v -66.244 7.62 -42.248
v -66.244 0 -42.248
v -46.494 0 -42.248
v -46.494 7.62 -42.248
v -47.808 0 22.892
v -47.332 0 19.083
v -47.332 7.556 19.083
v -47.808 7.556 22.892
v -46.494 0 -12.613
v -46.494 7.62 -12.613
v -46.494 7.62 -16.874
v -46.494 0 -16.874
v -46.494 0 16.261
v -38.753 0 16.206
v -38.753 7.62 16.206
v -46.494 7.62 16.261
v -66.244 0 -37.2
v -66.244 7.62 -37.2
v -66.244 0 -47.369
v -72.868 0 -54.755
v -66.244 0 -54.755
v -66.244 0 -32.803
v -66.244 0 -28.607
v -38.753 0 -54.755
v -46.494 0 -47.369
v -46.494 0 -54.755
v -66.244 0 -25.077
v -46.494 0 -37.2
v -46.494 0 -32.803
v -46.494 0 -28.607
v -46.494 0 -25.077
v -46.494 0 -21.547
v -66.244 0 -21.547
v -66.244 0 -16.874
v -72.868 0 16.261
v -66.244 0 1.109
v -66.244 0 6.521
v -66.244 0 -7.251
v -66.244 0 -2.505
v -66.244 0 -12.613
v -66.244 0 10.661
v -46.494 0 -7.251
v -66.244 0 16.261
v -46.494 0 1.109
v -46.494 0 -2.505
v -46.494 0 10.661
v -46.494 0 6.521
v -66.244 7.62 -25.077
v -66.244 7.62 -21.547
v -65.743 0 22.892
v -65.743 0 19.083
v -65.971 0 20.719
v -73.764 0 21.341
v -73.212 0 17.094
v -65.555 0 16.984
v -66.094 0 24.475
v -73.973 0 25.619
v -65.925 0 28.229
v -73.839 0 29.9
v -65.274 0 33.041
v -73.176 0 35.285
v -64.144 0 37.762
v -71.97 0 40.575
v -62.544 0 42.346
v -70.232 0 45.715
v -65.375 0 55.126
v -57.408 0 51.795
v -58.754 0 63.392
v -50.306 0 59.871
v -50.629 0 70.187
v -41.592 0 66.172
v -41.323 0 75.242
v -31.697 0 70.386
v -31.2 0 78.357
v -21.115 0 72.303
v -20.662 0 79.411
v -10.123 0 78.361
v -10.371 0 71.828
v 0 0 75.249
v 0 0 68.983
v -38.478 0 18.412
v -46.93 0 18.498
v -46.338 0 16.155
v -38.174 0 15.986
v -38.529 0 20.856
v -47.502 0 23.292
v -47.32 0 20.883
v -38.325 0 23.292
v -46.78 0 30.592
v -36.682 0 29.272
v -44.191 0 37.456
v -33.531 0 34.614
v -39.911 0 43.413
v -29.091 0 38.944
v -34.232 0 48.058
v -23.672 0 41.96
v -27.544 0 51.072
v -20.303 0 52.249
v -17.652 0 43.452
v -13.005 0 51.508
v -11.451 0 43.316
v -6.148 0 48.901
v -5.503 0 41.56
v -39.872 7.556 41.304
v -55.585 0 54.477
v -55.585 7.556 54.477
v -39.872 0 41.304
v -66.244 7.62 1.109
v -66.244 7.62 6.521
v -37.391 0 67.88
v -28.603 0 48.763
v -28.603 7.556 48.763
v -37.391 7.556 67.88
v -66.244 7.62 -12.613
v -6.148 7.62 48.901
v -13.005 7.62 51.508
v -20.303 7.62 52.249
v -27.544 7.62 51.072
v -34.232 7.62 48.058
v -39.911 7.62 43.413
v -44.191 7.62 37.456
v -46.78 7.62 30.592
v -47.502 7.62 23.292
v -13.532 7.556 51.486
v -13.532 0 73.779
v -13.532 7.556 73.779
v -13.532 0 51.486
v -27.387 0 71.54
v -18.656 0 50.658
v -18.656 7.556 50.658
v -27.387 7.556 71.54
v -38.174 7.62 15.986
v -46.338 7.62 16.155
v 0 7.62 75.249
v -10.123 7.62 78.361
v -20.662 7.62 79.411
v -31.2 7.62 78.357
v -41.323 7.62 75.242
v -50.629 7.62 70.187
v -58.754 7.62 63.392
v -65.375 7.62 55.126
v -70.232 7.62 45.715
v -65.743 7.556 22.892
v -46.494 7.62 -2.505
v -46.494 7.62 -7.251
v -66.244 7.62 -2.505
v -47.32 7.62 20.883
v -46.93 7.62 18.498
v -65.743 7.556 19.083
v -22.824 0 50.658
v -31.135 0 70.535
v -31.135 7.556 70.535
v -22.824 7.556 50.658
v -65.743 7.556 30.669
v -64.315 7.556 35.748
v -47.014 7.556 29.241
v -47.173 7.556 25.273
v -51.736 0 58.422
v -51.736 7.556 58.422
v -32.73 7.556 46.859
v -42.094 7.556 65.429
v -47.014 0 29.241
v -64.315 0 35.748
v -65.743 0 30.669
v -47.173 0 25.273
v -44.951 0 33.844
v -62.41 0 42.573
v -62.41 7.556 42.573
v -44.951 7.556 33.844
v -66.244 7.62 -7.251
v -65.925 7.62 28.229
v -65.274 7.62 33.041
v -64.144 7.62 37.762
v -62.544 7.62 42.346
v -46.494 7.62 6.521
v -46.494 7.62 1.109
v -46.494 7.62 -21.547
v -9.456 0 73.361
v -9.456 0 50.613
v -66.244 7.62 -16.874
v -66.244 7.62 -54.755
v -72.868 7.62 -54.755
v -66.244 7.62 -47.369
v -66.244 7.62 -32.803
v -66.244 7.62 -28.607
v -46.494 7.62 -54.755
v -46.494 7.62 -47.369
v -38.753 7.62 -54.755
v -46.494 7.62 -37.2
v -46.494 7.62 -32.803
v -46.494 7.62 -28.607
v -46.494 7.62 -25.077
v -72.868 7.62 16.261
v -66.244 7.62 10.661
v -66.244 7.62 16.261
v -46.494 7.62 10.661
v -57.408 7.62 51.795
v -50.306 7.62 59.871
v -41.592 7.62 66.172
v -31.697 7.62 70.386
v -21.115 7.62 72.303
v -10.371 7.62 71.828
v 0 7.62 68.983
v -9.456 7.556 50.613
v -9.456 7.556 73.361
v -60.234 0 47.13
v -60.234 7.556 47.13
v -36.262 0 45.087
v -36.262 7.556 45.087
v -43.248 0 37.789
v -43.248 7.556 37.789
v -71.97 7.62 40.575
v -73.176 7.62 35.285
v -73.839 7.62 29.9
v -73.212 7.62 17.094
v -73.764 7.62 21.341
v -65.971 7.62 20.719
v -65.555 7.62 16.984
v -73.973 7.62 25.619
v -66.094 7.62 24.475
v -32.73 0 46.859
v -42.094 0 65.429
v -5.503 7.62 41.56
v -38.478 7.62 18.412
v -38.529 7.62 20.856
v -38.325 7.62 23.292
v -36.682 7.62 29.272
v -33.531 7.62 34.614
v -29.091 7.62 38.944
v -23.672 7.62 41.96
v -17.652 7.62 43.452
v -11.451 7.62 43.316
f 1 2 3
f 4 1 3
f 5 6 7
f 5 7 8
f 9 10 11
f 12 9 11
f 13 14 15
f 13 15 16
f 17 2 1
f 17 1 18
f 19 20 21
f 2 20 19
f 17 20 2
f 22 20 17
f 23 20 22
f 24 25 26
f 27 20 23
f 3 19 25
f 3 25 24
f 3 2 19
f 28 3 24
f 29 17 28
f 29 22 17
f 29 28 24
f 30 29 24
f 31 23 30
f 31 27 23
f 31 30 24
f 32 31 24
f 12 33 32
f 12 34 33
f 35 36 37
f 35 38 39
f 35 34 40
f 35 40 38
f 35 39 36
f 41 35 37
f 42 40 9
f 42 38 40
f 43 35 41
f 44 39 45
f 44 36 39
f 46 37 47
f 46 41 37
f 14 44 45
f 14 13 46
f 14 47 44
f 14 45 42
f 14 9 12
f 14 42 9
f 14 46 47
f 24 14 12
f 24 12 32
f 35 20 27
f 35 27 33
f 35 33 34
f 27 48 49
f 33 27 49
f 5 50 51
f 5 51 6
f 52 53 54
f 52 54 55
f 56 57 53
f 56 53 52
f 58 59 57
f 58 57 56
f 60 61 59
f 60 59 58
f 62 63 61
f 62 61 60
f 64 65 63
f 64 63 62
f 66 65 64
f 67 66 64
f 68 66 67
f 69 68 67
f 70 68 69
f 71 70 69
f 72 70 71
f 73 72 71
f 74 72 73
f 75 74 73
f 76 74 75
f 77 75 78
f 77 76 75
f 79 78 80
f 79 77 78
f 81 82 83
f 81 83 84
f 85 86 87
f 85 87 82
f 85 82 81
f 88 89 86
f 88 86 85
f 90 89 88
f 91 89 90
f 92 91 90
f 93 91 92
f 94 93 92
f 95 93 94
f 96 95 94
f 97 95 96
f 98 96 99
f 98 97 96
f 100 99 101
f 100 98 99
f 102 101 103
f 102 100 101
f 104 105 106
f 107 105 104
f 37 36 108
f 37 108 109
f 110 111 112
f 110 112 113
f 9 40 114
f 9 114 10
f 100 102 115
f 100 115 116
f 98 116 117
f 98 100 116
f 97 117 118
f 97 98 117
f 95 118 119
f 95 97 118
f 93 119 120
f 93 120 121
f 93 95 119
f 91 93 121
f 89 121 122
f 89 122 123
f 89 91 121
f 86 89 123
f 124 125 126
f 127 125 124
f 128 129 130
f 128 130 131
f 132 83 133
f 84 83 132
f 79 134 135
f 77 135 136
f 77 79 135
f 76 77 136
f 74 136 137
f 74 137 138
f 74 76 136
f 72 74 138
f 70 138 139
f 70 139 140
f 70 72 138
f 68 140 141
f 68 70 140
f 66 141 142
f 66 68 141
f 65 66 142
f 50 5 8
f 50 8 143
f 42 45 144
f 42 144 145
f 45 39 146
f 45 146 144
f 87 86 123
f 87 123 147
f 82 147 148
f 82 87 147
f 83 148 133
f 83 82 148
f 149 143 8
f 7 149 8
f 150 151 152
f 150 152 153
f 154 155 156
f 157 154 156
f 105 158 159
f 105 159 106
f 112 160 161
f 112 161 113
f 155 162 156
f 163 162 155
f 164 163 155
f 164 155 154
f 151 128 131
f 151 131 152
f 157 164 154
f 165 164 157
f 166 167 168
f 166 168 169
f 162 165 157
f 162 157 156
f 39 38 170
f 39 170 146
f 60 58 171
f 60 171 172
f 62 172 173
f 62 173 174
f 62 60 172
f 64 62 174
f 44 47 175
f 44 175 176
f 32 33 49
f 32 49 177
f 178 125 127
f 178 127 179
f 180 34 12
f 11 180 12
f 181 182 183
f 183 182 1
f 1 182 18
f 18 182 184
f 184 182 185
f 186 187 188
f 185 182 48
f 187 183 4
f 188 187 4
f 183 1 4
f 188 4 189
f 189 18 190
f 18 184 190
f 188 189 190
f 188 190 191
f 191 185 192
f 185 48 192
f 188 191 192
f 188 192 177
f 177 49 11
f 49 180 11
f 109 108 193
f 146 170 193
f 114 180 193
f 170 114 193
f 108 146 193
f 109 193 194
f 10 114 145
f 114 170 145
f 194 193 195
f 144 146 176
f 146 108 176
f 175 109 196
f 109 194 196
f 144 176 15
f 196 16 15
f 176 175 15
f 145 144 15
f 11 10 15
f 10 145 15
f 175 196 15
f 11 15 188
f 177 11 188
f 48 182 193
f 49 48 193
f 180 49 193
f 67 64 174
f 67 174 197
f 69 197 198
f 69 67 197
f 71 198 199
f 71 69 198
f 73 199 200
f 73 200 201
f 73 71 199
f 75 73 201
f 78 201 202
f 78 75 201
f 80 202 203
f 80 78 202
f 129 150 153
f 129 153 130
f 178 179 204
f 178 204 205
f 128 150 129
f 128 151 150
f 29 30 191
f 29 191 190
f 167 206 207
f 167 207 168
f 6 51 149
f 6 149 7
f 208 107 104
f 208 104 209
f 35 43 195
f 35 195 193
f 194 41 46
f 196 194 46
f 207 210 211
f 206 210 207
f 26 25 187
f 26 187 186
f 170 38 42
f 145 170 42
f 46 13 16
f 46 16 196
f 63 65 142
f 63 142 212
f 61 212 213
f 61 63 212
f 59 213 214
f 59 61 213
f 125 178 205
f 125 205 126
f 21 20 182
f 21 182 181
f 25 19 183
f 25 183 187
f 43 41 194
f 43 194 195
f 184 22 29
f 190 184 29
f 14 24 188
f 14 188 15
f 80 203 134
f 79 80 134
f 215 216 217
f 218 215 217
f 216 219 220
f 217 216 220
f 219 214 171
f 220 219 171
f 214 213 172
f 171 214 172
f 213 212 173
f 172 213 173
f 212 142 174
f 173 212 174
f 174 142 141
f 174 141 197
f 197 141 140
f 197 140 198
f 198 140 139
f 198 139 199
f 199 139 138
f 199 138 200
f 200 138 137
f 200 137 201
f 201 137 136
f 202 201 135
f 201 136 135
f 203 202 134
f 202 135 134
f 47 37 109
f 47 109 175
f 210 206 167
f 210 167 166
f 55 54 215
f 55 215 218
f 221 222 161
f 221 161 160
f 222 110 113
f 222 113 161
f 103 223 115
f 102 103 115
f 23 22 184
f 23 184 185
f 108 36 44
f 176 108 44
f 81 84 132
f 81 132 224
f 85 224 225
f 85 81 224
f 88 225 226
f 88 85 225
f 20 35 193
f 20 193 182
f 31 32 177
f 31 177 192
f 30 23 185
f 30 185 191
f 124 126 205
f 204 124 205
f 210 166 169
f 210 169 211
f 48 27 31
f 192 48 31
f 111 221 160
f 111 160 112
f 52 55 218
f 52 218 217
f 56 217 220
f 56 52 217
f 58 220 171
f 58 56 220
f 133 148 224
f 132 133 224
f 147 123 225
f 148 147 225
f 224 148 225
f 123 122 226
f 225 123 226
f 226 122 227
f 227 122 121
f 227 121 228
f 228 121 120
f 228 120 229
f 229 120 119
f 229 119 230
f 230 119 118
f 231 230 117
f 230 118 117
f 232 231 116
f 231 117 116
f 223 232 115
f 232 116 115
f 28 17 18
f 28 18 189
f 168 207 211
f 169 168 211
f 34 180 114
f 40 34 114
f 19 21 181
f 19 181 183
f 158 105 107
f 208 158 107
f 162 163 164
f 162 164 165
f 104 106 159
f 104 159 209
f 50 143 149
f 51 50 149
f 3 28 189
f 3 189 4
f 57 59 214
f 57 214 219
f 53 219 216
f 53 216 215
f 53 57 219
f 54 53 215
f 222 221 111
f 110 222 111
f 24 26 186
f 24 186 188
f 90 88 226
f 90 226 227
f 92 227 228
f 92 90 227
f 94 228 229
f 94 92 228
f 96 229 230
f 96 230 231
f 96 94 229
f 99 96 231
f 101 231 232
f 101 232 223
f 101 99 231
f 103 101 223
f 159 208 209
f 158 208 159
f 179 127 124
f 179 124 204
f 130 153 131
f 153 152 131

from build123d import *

# Parameters (mm, degrees)
F0_W     = 19.7499133646
F0_H     = 4.1402331553
F0_H_2   = 5.3616189398
F0_H_3   = 3.6131842062
F0_H_4   = 4.6723466367
F0_H_5   = 3.5303737968
F0_H_6   = 4.3972805142
F0_H_7   = 5.121588707
F1_DEPTH = 7.62
F3_DEPTH = 7.62
F5_DEPTH = 7.5565


with BuildPart() as f1:
    # F0 (on Front) → F1 (new body)
    with BuildSketch(Plane.XZ):
        with Locations((-56.3687663525, 8.5909834597)):
            Rectangle(F0_W, F0_H)
        Polygon((-66.2437230349, 16.2607766688), (-72.8681012988, 16.2607766688), (-72.8681012988, -54.7545775771), (-66.2437230349, -54.7545775771), (-66.2437230349, -51.4237135649), (-66.2437230349, -47.3692491651), (-66.2437230349, -42.2476604581), (-66.2437230349, -37.200499326), (-66.2437230349, -32.8032188118), (-66.2437230349, -28.6069251597), (-66.2437230349, -25.0765513629), (-66.2437230349, -21.5465798974), (-66.2437230349, -16.8742332608), (-66.2437230349, -12.6126082614), (-66.2437230349, -7.2509893216), (-66.2437230349, -2.5046177907), (-66.2437230349, 1.1085664155), (-66.2437230349, 6.5208668821), (-66.2437230349, 10.6611000374), align=None)
        Polygon((-46.4938096702, 16.2607766688), (-46.4938096702, 10.6611000374), (-46.4938096702, 6.5208668821), (-46.4938096702, 1.1085664155), (-46.4938096702, -2.5046177907), (-46.4938096702, -7.2509893216), (-46.4938096702, -12.6126082614), (-46.4938096702, -16.8742332608), (-46.4938096702, -21.5465798974), (-46.4938096702, -25.0765513629), (-46.4938096702, -28.6069251597), (-46.4938096702, -32.8032188118), (-46.4938096702, -37.200499326), (-46.4938096702, -42.2476604581), (-46.4938096702, -47.3692491651), (-46.4938096702, -51.4237135649), (-46.4938096702, -54.7545775771), (-38.75323385, -54.7545775771), (-38.75323385, 16.2060605315), align=None)
        with Locations((-56.3687663525, -9.9317987915)):
            Rectangle(F0_W, F0_H_2)
        with Locations((-56.3687663525, -0.6980256876)):
            Rectangle(F0_W, F0_H_3)
        with Locations((-56.3687663525, -19.2104065791)):
            Rectangle(F0_W, F0_H_4)
        with Locations((-56.3687663525, -26.8417382613)):
            Rectangle(F0_W, F0_H_5)
        with Locations((-56.3687663525, -35.0018590689)):
            Rectangle(F0_W, F0_H_6)
        with Locations((-56.3687663525, -44.8084548116)):
            Rectangle(F0_W, F0_H_7)
    extrude(amount=-F1_DEPTH)


with BuildPart() as f3:
    # F2 (on Front) → F3 (new body)
    with BuildSketch(Plane.XZ):
        with BuildLine():
            Line((-62.5437365724, 42.3459186364), (-70.2318590901, 45.7149749259))
            ThreePointArc((-70.2318590901, 45.7149749259), (-72.6403068231, 37.9456046034), (-73.8390220772, 29.9003067573))
            Line((-73.8390220772, 29.9003067573), (-65.9249098405, 28.2293552639))
            ThreePointArc((-65.9249098405, 28.2293552639), (-64.7684249363, 35.4155640131), (-62.5437365724, 42.3459186364))
        make_face()
        with BuildLine():
            Line((0, 68.9832940698), (0, 75.2493338258))
            ThreePointArc((0, 75.2493338258), (-41.3226643186, 75.2415917993), (-70.2318590901, 45.7149749259))
            Line((-70.2318590901, 45.7149749259), (-62.5437365724, 42.3459186364))
            ThreePointArc((-62.5437365724, 42.3459186364), (-36.7623252254, 68.5560300344), (0, 68.9832940698))
        make_face()
        with BuildLine():
            Line((-65.9249098405, 28.2293552639), (-73.8390220772, 29.9003067573))
            ThreePointArc((-73.8390220772, 29.9003067573), (-73.9116137916, 23.4781636582), (-73.2115656137, 17.0938763767))
            Line((-73.2115656137, 17.0938763767), (-65.5552223325, 16.9843509793))
            ThreePointArc((-65.5552223325, 16.9843509793), (-66.0690778908, 22.5960366247), (-65.9249098405, 28.2293552639))
        make_face()
    extrude(amount=-F3_DEPTH)


with BuildPart() as f3b:
    # F2 (on Front) → F3, piece 2 (new body)
    with BuildSketch(Plane.XZ):
        with BuildLine():
            Line((-38.3250617533, 23.2918610972), (-47.502199357, 23.2918610972))
            ThreePointArc((-47.502199357, 23.2918610972), (-47.1507315945, 19.6859497569), (-46.3375218112, 16.1553951219))
            Line((-46.3375218112, 16.1553951219), (-38.1738982421, 15.9859235735))
            ThreePointArc((-38.1738982421, 15.9859235735), (-38.5354828094, 19.6329747937), (-38.3250617533, 23.2918610972))
        make_face()
        with BuildLine():
            Line((-5.50289784, 41.5603978369), (-6.147863663, 48.9014534144))
            ThreePointArc((-6.147863663, 48.9014534144), (-34.2322336603, 48.0577974598), (-47.502199357, 23.2918610972))
            Line((-47.502199357, 23.2918610972), (-38.3250617533, 23.2918610972))
            ThreePointArc((-38.3250617533, 23.2918610972), (-26.4812919334, 40.6319901624), (-5.50289784, 41.5603978369))
        make_face()
    extrude(amount=-F3_DEPTH)


with BuildPart() as f5:
    # F4 (on Front) → F5 (new body)
    with BuildSketch(Plane.XZ):
        Polygon((-47.8079319, 22.8921640664), (-65.7432675362, 22.8921640664), (-65.7432675362, 19.0828908235), (-47.3317727447, 19.0828908235), align=None)
    extrude(amount=-F5_DEPTH)


with BuildPart() as f5b:
    # F4 (on Front) → F5, piece 2 (new body)
    with BuildSketch(Plane.XZ):
        Polygon((-47.0143333077, 29.2409546673), (-64.3147900701, 35.748463124), (-65.7432675362, 30.6694321334), (-47.1730530262, 25.2729598433), align=None)
    extrude(amount=-F5_DEPTH)


with BuildPart() as f5c:
    # F4 (on Front) → F5, piece 3 (new body)
    with BuildSketch(Plane.XZ):
        Polygon((-60.2338463068, 47.1303761005), (-62.4101497233, 42.5734147429), (-44.9509769678, 33.8438265026), (-43.2478673756, 37.7892069519), align=None)
    extrude(amount=-F5_DEPTH)


with BuildPart() as f5d:
    # F4 (on Front) → F5, piece 4 (new body)
    with BuildSketch(Plane.XZ):
        Polygon((-9.4558084384, 73.3607187867), (-13.531729579, 73.7794563174), (-13.531729579, 51.4859540419), (-9.4558084384, 50.612542735), align=None)
    extrude(amount=-F5_DEPTH)


with BuildPart() as f5e:
    # F4 (on Front) → F5, piece 5 (new body)
    with BuildSketch(Plane.XZ):
        Polygon((-22.8244807163, 50.6583079696), (-18.6562426388, 50.6583079696), (-27.3872411671, 71.539883226), (-31.1353038996, 70.534966886), align=None)
    extrude(amount=-F5_DEPTH)


with BuildPart() as f5f:
    # F4 (on Front) → F5, piece 6 (new body)
    with BuildSketch(Plane.XZ):
        Polygon((-37.3910926282, 67.8804144263), (-42.0940220356, 65.4290616512), (-32.7295549214, 46.8588471413), (-28.6028403789, 48.763487488), align=None)
    extrude(amount=-F5_DEPTH)


with BuildPart() as f5g:
    # F4 (on Front) → F5, piece 7 (new body)
    with BuildSketch(Plane.XZ):
        Polygon((-36.2620055676, 45.0874976814), (-51.7359450459, 58.4216453135), (-55.5852018297, 54.4773973525), (-39.8719459772, 41.3036569953), align=None)
    extrude(amount=-F5_DEPTH)


solid = Compound([f1.part, f3.part, f3b.part, f5.part, f5b.part, f5c.part, f5d.part, f5e.part, f5f.part, f5g.part])
